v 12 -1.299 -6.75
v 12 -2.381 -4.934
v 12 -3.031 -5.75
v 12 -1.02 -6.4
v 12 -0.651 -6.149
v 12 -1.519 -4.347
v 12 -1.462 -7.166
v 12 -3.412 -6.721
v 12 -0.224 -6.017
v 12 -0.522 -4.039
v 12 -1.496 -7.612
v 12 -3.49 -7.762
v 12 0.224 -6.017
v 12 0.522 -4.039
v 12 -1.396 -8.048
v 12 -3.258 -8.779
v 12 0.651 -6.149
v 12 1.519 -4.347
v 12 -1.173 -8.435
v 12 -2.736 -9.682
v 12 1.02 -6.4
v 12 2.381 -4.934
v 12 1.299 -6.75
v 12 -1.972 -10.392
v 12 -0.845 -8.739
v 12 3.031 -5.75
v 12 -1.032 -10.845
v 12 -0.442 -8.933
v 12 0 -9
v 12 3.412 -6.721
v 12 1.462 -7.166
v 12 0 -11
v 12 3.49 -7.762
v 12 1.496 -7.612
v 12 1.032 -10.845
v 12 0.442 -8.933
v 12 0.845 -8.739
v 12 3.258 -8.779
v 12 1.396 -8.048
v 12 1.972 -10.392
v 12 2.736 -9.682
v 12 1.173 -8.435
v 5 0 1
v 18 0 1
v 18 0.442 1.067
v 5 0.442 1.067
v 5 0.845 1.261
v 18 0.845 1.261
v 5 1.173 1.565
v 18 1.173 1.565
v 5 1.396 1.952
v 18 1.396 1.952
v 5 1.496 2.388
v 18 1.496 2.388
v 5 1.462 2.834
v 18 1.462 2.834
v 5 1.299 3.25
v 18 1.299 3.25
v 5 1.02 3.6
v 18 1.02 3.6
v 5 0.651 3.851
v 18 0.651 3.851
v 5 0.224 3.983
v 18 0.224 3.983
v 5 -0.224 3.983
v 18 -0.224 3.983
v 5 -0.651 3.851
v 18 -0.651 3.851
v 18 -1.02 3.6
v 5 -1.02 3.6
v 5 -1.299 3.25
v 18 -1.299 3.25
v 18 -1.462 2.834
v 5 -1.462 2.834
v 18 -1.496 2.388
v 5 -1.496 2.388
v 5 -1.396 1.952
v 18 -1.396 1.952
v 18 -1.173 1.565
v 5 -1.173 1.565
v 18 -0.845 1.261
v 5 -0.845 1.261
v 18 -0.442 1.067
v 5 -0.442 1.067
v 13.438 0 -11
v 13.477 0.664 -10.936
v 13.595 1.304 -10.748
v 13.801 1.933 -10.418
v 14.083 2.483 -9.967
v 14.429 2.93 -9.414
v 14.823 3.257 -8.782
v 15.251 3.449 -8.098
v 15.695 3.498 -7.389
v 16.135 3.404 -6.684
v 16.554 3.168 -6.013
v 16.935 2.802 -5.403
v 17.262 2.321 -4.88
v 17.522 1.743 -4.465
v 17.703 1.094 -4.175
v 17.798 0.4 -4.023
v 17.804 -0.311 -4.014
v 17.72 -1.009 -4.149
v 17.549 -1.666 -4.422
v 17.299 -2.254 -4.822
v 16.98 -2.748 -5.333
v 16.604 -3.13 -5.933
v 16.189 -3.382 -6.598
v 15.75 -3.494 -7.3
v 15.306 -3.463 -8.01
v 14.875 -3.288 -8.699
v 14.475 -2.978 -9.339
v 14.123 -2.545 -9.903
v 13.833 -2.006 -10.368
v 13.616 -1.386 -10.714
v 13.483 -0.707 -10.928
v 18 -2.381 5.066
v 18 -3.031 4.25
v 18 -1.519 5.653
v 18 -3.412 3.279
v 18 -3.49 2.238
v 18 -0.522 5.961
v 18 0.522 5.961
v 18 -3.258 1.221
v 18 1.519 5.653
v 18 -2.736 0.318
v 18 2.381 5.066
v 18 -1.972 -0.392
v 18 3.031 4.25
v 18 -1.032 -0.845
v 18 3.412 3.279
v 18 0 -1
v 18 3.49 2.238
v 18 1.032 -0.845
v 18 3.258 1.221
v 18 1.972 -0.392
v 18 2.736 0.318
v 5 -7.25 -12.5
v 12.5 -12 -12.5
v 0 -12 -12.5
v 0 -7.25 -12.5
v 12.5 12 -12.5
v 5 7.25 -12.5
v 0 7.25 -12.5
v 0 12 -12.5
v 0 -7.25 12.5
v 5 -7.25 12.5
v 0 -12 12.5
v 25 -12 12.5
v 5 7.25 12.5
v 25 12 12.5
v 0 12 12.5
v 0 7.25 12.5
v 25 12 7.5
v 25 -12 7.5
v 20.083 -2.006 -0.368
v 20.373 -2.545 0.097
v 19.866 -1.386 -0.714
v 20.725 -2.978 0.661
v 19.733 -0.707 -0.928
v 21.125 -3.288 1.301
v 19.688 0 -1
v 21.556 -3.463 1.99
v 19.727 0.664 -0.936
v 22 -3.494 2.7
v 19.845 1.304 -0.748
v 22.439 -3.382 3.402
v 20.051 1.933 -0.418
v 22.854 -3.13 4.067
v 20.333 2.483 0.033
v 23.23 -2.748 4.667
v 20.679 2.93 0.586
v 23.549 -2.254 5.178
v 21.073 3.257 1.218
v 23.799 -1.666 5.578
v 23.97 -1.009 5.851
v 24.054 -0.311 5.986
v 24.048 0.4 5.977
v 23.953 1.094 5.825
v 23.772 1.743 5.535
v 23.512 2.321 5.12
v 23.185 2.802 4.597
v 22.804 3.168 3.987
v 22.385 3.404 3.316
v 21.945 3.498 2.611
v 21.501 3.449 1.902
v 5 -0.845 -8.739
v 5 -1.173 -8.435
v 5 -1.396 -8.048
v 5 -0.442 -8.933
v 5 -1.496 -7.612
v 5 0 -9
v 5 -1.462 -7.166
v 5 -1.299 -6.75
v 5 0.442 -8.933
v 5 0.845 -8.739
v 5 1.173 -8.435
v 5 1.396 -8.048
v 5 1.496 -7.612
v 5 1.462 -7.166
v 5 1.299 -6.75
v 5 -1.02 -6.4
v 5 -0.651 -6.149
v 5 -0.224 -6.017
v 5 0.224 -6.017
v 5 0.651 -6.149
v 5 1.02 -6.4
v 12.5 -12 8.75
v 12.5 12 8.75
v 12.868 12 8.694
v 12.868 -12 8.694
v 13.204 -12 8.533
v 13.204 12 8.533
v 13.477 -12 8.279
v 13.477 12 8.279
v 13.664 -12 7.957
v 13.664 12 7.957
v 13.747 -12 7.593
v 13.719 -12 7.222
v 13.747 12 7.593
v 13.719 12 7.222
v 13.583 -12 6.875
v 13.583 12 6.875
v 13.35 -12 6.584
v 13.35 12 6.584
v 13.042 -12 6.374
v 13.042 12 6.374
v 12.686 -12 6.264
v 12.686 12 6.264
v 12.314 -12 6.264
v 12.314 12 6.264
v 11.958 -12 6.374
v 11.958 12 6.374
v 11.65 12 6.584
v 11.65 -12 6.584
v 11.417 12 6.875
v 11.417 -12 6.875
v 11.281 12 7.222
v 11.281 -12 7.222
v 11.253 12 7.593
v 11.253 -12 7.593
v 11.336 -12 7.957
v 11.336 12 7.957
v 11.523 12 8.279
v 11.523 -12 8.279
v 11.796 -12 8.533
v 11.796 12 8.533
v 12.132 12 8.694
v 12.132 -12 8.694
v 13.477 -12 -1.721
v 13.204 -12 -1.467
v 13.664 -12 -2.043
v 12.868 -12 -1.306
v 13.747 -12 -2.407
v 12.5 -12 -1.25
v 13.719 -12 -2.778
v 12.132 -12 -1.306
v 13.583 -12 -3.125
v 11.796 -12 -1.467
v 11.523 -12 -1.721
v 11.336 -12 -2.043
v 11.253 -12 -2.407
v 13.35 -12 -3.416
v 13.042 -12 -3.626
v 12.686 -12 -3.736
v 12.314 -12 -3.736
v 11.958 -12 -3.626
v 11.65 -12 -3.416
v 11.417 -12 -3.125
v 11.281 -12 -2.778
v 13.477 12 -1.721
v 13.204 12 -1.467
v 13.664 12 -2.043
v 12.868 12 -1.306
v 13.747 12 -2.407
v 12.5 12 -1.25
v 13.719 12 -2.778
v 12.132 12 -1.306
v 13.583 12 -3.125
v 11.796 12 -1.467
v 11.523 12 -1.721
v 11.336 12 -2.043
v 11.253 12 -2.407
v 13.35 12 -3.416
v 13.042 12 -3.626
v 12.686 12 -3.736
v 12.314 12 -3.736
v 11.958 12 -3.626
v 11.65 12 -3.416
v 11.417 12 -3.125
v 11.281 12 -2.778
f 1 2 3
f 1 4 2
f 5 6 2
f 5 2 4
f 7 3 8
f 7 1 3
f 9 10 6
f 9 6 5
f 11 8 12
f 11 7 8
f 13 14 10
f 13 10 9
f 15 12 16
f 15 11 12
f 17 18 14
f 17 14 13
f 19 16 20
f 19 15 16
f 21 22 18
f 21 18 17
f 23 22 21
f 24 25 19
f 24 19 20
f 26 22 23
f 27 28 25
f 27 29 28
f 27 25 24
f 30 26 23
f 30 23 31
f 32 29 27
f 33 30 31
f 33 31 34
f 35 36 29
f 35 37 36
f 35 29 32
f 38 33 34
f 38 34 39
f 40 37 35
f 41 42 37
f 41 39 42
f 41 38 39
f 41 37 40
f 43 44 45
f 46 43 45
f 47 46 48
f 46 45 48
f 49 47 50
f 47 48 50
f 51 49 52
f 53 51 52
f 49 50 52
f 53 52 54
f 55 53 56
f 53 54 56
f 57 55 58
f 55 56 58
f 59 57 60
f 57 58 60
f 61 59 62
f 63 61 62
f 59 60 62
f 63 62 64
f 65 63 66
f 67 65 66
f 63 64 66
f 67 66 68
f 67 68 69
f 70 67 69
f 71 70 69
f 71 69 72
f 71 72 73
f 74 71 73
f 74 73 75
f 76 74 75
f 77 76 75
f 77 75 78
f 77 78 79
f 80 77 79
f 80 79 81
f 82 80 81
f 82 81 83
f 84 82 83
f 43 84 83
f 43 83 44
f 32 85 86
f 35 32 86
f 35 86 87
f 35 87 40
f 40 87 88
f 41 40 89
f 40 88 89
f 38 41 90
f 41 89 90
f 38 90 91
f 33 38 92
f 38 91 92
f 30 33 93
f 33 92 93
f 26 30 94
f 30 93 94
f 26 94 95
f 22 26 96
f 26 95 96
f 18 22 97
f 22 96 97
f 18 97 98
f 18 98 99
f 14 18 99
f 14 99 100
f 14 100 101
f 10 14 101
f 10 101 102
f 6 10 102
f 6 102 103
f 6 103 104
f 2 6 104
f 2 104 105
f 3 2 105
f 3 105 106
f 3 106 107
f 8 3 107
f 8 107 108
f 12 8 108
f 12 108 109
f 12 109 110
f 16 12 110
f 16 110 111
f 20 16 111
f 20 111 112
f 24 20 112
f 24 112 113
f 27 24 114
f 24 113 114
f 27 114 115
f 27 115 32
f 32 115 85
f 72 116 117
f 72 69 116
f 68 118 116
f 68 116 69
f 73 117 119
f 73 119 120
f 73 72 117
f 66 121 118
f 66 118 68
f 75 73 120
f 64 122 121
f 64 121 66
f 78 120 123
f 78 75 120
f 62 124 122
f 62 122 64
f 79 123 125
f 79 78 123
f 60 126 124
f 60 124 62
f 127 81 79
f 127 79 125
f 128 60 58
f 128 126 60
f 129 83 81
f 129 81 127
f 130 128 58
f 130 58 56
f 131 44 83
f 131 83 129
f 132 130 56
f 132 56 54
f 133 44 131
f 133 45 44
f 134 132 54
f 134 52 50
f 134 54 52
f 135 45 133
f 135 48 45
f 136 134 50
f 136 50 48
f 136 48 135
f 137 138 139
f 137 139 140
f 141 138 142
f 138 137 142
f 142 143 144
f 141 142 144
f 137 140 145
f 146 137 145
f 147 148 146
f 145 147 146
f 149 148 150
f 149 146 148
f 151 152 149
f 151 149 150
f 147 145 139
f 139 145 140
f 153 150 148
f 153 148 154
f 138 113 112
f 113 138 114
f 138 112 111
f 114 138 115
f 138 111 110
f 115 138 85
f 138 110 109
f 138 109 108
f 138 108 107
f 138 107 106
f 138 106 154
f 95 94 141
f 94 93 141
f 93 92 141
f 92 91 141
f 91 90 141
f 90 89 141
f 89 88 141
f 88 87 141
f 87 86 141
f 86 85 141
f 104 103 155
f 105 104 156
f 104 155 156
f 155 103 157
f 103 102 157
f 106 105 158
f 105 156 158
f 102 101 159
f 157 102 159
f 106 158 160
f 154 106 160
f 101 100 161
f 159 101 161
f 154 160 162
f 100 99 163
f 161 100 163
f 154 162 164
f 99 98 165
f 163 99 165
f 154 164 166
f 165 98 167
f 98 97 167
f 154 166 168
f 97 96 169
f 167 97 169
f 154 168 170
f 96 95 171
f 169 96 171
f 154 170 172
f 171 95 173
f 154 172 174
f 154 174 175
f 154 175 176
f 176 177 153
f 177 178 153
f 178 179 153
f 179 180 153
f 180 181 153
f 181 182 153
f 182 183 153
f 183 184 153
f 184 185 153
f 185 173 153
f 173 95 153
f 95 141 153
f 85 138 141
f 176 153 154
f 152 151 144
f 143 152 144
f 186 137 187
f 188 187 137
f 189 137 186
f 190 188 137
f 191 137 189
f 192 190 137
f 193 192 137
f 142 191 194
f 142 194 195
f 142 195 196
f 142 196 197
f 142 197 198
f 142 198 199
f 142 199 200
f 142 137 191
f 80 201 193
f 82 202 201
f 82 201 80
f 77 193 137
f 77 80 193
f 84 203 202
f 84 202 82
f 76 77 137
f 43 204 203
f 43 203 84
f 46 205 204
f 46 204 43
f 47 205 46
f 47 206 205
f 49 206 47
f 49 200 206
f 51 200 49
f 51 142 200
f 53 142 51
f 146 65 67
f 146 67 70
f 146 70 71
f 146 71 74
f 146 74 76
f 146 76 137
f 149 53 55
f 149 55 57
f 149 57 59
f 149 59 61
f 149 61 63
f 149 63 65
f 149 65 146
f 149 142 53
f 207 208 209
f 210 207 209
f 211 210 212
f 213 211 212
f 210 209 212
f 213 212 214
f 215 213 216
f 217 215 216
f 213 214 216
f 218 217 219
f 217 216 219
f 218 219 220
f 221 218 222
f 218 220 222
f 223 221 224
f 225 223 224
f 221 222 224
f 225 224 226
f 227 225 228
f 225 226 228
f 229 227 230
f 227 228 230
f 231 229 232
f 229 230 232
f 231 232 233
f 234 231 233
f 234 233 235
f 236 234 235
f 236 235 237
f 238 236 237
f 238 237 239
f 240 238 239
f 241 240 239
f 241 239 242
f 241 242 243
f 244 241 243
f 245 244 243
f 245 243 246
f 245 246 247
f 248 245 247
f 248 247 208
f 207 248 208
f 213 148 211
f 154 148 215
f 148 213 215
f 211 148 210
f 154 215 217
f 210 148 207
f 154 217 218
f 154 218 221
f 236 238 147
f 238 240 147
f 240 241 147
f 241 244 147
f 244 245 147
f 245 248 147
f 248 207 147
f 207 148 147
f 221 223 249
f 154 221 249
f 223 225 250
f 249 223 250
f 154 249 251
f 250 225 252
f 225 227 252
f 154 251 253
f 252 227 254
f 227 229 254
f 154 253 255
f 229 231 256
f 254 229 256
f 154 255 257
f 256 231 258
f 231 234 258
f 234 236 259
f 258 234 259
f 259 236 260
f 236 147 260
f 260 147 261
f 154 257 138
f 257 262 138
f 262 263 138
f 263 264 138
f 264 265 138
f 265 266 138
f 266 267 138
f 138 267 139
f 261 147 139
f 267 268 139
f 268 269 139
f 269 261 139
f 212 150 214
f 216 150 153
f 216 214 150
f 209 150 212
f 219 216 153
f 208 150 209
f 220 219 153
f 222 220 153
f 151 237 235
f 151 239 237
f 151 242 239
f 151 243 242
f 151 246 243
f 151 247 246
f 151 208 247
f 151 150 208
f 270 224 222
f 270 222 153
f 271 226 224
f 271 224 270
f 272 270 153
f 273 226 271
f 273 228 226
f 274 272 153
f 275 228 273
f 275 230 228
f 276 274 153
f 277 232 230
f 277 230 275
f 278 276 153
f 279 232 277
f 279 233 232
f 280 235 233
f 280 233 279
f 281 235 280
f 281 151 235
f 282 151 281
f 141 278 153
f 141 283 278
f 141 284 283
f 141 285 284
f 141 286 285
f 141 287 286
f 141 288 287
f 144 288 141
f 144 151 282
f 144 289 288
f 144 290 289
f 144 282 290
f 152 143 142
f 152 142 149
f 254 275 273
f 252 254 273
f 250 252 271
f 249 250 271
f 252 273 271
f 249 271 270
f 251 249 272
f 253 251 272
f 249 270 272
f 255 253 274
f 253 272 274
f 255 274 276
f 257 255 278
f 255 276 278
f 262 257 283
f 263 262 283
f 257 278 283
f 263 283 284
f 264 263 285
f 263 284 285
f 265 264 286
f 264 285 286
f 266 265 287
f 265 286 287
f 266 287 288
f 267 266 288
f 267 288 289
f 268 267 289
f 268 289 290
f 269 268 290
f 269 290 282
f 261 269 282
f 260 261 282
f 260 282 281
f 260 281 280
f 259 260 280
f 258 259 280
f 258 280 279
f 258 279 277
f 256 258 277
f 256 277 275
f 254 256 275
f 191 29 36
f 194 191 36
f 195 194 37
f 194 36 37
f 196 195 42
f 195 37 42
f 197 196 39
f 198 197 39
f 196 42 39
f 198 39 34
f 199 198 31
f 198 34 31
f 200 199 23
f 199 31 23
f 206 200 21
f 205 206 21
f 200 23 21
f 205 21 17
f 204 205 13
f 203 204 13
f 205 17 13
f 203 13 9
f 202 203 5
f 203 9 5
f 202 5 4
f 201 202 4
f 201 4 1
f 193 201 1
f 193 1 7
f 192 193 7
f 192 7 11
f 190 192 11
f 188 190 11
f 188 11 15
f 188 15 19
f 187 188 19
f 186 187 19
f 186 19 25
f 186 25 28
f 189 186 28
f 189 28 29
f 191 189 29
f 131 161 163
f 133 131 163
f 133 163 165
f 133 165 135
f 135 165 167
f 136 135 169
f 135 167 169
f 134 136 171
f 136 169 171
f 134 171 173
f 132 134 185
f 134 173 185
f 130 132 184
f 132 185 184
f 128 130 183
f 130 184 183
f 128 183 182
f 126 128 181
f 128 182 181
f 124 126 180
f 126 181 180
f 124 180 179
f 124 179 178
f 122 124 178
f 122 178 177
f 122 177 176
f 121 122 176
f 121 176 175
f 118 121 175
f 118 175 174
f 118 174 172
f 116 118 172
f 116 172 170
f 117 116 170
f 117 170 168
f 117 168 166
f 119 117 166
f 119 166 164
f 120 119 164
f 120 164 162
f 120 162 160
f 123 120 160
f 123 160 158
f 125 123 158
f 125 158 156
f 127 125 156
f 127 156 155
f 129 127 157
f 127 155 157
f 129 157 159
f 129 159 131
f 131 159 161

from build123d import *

# Parameters (mm, degrees)
SKETCH_1_W          = 25
SKETCH_1_H          = 24
EXTRUDE_1_DEPTH     = 25
SKETCH_2_W          = 25
SKETCH_2_H          = 14.5
CUT_EXTRUDE_1_DEPTH = 5
SKETCH_3_R          = 1.5
CUT_EXTRUDE_2_DEPTH = 31.417922349
CUT_EXTRUDE_3_DEPTH = 37.84087404
SKETCH_6_R          = 3.5
CUT_EXTRUDE_4_DEPTH = 13
SKETCH_7_R          = 3.5
CUT_EXTRUDE_5_DEPTH = 7
SKETCH_8_R          = 1.25
CUT_EXTRUDE_6_DEPTH = 37.84087404


with BuildPart() as part:
    # 草图1 → 凸台-拉伸1 (new body)
    with BuildSketch(Plane(origin=(0, 0, 0), x_dir=(0, 0, -1), z_dir=(1, 0, 0))):
        Rectangle(SKETCH_1_W, SKETCH_1_H)
    extrude(amount=EXTRUDE_1_DEPTH)

    # 草图2 → 切除-拉伸1 (cut)
    with BuildSketch(Plane.ZY):
        Rectangle(SKETCH_2_W, SKETCH_2_H)
    extrude(amount=-CUT_EXTRUDE_1_DEPTH, mode=Mode.SUBTRACT)

    # 草图3 → 切除-拉伸2 (cut, through all)
    with BuildSketch(Plane(origin=(25, 0, 0), x_dir=(0, 0, -1), z_dir=(1, 0, 0))):
        with Locations((-2.5, 0)):
            Circle(SKETCH_3_R)
        with Locations((7.5, 0)):
            Circle(SKETCH_3_R)
    extrude(amount=-CUT_EXTRUDE_2_DEPTH, mode=Mode.SUBTRACT)

    # 草图5 → 切除-拉伸3 (cut, through all)
    with BuildSketch(Plane(origin=(0, 12, 0), x_dir=(1, 0, 0), z_dir=(0, 1, 0))):
        Polygon((12.5, 12.5), (25, -7.5), (25, 12.5), align=None)
    extrude(amount=-CUT_EXTRUDE_3_DEPTH, mode=Mode.SUBTRACT)

    # 草图6 → 切除-拉伸4 (cut)
    with BuildSketch(Plane(origin=(25, 0, 0), x_dir=(0, 0, -1), z_dir=(1, 0, 0))):
        with Locations((7.5, 0)):
            Circle(SKETCH_6_R)
    extrude(amount=-CUT_EXTRUDE_4_DEPTH, mode=Mode.SUBTRACT)

    # 草图7 → 切除-拉伸5 (cut)
    with BuildSketch(Plane(origin=(25, 0, 0), x_dir=(0, 0, -1), z_dir=(1, 0, 0))):
        with Locations((-2.5, 0)):
            Circle(SKETCH_7_R)
    extrude(amount=-CUT_EXTRUDE_5_DEPTH, mode=Mode.SUBTRACT)

    # 草图8 → 切除-拉伸6 (cut, through all)
    with BuildSketch(Plane(origin=(0, 12, 0), x_dir=(1, 0, 0), z_dir=(0, 1, 0))):
        with Locations(Location((12.5, 2.5, 0), (0, 0, 270))):
            Circle(SKETCH_8_R)
        with Locations(Location((12.5, -7.5, 0), (0, 0, 270))):
            Circle(SKETCH_8_R)
    extrude(amount=-CUT_EXTRUDE_6_DEPTH, mode=Mode.SUBTRACT)


solid = part.part
